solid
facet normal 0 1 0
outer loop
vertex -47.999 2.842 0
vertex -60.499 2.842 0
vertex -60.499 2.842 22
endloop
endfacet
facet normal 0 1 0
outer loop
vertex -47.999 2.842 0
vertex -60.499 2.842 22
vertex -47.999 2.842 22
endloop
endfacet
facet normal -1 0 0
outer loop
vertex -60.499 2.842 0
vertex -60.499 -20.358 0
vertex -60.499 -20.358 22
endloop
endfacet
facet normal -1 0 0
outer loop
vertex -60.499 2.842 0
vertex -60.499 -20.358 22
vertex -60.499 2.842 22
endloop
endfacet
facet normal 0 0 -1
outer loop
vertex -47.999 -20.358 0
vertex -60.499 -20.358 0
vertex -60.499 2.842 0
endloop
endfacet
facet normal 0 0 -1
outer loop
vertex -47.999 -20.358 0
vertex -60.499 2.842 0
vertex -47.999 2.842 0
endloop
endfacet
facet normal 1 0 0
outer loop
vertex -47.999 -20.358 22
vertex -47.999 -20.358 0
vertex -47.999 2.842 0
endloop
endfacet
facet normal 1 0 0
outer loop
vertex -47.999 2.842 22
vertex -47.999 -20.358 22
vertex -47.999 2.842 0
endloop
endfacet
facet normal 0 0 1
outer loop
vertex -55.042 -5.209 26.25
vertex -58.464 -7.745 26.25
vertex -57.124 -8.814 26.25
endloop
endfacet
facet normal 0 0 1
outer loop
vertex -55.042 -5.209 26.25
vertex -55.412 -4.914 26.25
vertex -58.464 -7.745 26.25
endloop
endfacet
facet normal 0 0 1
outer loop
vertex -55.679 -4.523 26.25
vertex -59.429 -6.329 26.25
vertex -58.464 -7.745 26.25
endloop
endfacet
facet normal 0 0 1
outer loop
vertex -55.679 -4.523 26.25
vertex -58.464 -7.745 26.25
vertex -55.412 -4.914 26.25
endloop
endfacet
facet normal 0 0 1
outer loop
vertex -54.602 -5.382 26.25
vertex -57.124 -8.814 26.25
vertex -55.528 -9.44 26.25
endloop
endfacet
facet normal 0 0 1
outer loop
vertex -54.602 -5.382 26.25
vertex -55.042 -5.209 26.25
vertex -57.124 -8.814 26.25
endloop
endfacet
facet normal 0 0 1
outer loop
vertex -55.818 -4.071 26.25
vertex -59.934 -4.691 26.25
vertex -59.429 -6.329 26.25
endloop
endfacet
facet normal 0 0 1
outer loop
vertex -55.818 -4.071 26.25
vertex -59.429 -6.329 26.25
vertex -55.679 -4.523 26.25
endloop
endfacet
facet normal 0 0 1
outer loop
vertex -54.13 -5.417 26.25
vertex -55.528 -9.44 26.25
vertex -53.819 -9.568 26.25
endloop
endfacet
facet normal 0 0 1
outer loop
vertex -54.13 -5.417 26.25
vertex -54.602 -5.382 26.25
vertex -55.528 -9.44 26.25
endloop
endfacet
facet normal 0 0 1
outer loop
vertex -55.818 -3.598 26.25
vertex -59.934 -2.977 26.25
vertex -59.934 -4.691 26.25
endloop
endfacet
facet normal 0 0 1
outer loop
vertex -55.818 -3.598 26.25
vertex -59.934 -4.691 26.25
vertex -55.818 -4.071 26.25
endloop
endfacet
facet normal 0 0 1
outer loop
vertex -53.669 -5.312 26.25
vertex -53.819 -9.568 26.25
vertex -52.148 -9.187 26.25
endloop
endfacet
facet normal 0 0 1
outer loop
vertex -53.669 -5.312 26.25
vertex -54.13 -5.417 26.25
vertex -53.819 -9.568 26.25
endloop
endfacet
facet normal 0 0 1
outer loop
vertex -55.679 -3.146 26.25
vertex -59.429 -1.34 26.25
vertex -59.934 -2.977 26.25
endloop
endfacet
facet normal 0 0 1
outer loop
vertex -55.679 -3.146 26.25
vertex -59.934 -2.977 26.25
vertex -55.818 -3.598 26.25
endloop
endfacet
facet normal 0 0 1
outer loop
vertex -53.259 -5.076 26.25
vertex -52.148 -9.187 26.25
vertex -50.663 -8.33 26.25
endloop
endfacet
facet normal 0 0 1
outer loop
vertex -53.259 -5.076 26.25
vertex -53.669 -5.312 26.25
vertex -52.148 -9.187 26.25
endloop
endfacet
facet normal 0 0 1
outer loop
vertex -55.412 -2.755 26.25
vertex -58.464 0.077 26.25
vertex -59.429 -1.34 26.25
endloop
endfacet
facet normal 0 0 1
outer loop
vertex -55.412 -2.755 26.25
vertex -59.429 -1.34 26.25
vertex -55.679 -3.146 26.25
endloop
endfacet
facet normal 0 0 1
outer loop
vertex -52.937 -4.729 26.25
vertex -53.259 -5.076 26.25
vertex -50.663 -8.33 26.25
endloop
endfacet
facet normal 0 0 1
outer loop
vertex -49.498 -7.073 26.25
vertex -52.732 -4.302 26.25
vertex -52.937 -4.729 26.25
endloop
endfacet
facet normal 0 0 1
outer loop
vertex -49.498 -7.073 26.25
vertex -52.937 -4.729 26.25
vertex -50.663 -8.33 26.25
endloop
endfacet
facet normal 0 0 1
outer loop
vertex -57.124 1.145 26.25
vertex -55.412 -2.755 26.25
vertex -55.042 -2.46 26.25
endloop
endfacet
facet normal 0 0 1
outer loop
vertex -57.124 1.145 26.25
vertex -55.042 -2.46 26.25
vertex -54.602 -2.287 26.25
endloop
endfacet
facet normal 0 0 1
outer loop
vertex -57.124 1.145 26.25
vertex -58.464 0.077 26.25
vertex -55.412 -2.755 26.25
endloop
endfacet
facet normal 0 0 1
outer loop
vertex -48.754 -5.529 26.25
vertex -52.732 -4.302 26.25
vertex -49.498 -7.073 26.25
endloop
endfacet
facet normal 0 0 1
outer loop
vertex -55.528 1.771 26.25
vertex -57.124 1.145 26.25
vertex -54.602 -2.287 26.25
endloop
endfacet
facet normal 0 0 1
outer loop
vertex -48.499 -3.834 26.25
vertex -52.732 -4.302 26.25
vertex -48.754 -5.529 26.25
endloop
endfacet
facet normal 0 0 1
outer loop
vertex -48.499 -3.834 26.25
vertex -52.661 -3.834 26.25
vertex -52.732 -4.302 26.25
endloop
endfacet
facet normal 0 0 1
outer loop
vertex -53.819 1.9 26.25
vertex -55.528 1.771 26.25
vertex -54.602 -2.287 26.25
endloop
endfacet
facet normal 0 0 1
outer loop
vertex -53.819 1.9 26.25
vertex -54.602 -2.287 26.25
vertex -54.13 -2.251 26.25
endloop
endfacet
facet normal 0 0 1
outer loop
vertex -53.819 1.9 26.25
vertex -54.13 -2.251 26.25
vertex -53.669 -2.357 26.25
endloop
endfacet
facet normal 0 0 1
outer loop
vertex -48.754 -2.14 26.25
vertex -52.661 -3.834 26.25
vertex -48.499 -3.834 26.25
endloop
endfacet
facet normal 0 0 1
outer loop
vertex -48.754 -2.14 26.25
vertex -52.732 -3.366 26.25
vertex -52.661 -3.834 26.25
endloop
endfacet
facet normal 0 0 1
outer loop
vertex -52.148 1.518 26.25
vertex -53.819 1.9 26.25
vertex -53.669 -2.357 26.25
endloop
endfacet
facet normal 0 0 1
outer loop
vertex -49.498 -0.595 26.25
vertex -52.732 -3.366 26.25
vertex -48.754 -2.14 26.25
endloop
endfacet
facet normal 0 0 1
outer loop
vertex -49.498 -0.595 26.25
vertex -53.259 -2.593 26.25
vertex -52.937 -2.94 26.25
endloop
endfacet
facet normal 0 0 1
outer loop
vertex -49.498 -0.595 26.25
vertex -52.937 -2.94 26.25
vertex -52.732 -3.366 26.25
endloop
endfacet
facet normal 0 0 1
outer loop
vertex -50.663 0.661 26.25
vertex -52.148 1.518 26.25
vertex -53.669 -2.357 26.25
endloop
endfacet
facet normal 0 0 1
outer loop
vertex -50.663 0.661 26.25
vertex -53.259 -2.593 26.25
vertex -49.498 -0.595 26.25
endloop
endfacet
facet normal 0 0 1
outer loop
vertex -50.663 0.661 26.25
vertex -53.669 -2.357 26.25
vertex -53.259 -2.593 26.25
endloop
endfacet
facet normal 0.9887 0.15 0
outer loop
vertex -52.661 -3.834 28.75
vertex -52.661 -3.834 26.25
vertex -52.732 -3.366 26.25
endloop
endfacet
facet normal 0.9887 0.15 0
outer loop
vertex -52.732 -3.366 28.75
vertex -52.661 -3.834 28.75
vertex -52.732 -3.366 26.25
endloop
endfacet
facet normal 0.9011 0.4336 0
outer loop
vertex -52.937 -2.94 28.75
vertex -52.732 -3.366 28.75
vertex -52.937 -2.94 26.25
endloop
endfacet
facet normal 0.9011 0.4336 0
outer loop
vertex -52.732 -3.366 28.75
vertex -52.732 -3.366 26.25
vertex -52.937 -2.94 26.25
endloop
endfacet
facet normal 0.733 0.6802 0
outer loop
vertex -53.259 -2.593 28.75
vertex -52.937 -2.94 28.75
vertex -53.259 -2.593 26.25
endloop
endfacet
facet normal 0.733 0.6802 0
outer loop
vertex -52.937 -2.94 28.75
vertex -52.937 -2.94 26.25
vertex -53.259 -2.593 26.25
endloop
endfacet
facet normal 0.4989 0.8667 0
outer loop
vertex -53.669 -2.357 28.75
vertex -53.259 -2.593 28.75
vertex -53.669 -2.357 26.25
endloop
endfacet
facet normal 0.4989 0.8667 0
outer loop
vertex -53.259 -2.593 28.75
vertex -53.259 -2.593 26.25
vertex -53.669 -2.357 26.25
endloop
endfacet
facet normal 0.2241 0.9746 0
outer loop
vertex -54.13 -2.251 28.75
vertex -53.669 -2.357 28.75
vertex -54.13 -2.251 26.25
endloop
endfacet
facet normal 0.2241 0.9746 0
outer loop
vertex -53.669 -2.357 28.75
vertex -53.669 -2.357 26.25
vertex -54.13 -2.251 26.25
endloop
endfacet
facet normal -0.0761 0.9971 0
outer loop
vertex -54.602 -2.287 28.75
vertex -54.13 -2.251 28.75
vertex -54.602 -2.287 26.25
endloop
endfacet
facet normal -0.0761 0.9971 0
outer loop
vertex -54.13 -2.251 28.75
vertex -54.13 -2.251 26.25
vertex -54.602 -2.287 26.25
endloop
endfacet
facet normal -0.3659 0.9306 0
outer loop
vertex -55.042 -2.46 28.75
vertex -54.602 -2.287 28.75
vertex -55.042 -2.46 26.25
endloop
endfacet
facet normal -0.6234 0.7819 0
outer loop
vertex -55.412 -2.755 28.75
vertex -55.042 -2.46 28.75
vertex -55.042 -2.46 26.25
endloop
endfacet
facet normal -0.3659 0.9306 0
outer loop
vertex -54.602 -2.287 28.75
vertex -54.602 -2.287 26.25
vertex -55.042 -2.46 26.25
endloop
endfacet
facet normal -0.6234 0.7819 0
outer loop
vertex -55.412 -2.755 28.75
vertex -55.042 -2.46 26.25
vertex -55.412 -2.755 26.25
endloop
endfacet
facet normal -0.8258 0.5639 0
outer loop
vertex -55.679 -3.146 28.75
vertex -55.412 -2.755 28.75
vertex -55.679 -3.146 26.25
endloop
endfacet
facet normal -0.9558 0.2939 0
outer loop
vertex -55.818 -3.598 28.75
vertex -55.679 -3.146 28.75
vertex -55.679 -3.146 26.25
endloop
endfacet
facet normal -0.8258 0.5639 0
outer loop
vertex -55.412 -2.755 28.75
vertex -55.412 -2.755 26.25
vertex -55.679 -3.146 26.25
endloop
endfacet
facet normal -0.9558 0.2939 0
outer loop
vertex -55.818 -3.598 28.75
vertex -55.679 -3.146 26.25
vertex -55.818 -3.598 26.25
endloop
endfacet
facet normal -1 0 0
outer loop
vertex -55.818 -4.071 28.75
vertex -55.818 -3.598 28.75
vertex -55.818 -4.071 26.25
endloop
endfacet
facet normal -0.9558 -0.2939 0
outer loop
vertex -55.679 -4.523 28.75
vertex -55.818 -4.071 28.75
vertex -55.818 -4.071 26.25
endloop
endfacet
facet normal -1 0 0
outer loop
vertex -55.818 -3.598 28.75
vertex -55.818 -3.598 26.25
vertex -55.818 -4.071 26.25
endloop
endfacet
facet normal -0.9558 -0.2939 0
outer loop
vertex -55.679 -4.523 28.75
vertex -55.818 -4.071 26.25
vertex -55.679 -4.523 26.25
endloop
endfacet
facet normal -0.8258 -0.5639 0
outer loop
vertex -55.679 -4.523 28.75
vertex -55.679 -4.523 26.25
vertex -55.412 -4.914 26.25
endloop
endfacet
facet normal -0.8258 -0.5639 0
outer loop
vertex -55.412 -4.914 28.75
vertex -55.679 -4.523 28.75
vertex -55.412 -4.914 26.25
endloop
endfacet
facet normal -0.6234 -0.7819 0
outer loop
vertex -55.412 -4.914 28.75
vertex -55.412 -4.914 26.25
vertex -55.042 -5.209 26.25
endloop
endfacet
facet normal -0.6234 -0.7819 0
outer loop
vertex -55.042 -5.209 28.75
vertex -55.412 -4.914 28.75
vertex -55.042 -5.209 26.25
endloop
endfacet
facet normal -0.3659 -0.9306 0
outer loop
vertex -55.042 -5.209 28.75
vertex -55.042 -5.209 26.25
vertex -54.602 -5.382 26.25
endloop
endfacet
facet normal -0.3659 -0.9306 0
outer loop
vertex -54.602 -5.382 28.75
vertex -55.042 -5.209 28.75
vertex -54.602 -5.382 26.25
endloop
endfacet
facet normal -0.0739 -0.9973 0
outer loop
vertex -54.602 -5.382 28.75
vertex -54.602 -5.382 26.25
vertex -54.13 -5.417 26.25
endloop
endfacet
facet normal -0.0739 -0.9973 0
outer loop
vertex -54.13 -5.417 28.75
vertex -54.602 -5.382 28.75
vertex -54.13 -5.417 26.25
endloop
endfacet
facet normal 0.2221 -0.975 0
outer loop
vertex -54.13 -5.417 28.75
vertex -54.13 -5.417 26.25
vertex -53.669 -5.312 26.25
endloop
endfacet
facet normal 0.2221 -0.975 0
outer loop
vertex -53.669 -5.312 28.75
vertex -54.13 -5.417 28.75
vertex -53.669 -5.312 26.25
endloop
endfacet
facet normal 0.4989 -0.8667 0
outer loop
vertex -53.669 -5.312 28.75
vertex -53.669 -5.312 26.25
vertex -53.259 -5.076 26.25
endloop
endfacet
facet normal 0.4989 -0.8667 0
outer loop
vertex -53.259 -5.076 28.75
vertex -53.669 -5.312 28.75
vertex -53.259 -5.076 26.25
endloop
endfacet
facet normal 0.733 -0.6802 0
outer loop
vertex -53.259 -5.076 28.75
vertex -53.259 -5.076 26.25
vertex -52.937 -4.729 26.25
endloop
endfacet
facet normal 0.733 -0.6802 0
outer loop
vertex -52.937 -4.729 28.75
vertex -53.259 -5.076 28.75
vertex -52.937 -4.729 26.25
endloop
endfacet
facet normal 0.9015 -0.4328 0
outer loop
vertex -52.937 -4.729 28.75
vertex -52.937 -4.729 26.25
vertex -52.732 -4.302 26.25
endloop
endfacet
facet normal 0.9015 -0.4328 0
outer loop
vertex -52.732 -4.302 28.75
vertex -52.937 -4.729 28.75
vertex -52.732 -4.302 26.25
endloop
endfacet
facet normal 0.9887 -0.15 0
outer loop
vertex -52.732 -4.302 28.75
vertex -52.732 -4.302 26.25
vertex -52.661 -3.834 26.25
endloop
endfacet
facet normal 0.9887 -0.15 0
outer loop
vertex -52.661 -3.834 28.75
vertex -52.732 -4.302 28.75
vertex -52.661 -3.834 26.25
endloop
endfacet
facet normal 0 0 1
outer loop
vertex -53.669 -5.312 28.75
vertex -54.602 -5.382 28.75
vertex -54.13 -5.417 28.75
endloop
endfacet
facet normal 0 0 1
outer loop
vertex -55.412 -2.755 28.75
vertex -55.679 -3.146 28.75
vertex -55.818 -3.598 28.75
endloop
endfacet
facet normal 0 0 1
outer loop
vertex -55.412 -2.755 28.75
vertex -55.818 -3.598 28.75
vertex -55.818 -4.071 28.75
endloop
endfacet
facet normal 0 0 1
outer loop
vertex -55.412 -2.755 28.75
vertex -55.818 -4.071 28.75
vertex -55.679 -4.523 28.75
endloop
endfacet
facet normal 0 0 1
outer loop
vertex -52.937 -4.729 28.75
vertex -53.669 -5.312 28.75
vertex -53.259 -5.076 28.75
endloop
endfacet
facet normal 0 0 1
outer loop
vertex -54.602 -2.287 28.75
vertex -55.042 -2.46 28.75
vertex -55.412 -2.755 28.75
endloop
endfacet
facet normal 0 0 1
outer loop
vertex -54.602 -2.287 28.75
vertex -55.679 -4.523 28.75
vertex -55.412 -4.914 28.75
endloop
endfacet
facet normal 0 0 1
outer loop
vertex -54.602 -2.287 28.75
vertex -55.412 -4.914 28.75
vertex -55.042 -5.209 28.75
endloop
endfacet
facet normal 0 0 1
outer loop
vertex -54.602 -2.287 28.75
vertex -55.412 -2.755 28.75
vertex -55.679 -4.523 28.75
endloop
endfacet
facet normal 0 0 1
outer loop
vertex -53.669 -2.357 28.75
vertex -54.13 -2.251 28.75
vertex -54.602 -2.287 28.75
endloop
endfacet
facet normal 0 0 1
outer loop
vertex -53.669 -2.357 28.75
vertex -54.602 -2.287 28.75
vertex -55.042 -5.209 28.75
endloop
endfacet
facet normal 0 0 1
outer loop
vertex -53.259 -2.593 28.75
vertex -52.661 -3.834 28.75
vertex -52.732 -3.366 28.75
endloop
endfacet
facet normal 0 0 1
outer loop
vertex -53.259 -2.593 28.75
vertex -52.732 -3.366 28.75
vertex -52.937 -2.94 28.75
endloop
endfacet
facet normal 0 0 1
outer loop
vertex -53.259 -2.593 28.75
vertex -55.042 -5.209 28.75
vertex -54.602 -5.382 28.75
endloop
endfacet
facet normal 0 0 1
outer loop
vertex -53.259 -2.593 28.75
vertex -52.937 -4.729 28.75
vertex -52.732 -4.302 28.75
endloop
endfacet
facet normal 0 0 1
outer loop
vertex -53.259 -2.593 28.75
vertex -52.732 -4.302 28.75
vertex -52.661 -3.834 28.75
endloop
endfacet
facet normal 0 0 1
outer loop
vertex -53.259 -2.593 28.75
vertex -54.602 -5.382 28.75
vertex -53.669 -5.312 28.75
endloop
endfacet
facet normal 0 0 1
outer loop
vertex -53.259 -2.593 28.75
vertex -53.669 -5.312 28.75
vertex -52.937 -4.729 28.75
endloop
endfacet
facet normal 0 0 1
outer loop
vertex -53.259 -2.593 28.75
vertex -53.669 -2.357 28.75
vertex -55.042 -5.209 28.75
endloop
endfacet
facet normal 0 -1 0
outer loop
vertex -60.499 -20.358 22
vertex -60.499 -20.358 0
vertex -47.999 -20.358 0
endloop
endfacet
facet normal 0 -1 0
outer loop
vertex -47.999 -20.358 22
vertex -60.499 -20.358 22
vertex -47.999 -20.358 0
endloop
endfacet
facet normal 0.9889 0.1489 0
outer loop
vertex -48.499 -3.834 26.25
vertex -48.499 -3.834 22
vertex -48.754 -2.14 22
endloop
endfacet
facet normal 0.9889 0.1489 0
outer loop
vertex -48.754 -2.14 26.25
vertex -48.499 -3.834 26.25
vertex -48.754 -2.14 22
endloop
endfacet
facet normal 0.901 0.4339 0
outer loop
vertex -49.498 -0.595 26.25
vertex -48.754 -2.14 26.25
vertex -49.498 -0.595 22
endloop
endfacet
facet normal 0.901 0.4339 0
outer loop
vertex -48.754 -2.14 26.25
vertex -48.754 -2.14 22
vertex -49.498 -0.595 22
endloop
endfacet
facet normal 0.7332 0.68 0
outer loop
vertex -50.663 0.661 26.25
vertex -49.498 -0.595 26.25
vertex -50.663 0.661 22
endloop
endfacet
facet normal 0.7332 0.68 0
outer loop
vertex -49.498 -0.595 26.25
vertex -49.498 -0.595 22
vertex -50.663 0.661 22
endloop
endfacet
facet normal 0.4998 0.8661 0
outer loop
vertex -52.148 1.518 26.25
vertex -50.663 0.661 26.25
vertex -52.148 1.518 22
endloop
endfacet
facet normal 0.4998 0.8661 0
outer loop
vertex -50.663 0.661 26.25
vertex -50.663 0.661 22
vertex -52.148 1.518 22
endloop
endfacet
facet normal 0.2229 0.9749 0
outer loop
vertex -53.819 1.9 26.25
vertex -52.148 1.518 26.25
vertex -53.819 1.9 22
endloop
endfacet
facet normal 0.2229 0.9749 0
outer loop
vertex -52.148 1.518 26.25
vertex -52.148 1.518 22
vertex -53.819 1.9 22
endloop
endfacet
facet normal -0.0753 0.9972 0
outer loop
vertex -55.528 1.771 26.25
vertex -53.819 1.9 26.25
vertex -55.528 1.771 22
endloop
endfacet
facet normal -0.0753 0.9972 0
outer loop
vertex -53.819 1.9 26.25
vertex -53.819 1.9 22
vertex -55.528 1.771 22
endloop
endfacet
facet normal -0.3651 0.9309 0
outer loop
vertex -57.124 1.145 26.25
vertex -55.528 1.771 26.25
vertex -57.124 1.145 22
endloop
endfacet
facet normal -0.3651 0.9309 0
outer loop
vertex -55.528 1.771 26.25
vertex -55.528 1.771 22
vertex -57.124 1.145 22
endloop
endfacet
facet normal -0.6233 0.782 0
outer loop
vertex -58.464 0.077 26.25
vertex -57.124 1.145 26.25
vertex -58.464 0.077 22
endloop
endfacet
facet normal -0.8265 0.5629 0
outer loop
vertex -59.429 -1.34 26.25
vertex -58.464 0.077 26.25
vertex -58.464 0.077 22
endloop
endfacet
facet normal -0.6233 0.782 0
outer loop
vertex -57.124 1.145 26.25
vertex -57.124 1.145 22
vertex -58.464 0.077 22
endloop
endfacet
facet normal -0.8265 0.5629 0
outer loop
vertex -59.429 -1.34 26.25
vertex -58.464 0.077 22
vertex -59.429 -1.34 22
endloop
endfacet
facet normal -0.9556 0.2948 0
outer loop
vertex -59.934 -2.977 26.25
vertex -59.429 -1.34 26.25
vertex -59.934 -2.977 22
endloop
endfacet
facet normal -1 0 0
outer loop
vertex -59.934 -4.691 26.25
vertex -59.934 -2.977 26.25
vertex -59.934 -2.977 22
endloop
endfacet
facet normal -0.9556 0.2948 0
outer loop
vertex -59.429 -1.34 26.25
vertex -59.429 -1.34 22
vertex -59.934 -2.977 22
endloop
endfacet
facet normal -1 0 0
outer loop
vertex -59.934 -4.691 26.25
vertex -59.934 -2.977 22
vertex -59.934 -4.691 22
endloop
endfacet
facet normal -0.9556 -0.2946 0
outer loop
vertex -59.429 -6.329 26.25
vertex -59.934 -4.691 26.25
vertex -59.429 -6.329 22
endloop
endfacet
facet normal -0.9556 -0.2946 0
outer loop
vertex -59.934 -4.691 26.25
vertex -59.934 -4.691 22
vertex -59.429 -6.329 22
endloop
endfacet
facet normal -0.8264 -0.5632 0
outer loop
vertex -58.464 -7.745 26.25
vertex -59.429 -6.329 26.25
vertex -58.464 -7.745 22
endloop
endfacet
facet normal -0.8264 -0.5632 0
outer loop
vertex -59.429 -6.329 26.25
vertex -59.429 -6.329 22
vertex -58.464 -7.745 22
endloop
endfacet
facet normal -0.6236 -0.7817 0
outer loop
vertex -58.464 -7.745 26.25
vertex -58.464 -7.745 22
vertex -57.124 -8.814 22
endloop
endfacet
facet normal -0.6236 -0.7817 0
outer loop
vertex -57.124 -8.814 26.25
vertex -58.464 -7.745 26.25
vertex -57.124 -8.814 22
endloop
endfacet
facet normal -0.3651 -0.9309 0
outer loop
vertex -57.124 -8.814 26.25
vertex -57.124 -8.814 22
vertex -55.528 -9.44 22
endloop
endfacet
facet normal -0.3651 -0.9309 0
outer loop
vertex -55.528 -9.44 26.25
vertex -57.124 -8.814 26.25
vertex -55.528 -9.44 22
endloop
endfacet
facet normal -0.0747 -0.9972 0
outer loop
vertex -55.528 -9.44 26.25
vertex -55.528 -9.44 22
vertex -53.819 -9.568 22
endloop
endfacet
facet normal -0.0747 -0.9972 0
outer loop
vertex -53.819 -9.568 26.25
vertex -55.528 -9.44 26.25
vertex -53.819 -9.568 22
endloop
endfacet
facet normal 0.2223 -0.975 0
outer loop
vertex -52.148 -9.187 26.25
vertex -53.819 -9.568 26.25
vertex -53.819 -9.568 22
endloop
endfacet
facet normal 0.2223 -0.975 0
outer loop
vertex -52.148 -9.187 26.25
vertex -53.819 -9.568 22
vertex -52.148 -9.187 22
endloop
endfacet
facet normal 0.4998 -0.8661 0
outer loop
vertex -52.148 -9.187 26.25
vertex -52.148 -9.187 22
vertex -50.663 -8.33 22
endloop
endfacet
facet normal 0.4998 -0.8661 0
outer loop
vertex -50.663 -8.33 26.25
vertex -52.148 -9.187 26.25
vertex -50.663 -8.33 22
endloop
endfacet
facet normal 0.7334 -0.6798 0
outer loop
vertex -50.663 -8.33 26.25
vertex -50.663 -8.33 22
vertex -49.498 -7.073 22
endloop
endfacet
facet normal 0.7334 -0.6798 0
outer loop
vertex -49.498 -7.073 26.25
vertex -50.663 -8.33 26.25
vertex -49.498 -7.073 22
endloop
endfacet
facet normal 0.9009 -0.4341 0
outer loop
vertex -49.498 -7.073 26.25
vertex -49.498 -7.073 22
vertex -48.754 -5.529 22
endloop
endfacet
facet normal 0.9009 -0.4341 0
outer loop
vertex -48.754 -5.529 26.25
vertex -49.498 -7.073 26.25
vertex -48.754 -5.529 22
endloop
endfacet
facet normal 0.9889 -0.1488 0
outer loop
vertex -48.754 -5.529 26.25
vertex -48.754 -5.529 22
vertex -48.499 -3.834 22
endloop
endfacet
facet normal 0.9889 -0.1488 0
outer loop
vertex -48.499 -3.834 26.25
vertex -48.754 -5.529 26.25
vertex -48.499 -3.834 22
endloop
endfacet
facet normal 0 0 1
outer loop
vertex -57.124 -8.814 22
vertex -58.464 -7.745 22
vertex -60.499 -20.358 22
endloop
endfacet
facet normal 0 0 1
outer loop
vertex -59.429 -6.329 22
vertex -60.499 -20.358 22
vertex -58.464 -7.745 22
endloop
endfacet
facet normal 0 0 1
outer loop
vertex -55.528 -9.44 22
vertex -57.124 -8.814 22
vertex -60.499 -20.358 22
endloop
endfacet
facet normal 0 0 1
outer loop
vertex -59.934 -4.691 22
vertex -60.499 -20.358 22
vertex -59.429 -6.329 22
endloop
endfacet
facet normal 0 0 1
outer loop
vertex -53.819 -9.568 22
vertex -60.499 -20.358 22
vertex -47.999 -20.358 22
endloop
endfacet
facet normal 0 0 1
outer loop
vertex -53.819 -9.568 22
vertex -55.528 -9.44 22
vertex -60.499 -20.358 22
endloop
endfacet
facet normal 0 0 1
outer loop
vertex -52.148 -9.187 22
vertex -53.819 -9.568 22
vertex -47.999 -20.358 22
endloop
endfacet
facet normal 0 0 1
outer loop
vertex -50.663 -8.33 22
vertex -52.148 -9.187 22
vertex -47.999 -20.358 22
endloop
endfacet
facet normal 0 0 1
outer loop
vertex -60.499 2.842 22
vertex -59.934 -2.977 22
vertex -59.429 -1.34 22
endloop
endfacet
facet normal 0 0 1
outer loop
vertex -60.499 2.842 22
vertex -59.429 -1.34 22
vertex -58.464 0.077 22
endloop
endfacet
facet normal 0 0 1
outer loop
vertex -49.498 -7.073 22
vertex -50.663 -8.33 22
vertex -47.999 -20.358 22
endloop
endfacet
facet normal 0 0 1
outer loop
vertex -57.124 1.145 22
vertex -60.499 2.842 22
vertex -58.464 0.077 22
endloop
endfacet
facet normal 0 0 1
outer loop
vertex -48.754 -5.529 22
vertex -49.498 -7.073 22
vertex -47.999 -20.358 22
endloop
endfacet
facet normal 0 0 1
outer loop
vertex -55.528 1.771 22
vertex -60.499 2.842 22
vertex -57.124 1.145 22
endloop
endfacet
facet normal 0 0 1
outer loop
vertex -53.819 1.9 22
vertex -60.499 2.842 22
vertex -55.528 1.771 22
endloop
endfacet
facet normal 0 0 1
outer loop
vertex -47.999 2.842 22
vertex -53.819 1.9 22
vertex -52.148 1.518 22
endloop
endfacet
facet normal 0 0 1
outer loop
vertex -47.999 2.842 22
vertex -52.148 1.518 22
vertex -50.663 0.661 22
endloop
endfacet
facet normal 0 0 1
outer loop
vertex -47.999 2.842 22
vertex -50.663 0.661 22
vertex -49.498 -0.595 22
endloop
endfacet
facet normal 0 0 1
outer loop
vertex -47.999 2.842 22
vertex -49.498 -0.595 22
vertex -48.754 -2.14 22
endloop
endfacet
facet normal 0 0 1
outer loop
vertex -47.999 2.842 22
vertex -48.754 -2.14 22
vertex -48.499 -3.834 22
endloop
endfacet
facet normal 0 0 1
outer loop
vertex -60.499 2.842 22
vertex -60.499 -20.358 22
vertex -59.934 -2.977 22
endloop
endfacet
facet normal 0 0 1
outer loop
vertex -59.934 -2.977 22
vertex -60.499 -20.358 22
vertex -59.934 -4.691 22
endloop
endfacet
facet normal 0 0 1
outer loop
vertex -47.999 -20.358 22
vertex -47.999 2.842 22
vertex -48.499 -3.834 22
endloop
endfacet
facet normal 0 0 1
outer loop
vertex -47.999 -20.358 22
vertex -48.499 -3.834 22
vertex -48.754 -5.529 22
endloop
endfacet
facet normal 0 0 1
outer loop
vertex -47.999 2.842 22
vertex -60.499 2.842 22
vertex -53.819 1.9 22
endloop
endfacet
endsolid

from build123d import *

# Parameters (mm, degrees)
F0_W     = 12.5
F0_H     = 23.2
F0_R     = 5.75
F0_R_2   = 1.5875
F1_DEPTH = 22
F2_DEPTH = 26.25
F3_DEPTH = 28.75


with BuildPart() as f1:
    # F0 (on Top) → F1 (new body)
    with BuildSketch(Plane.XY):
        with Locations((-54.248546, -8.758007)):
            Rectangle(F0_W, F0_H)
        with Locations((-54.248546, -3.834351)):
            Circle(F0_R, mode=Mode.SUBTRACT)
        with Locations((-54.248546, -3.834351)):
            Circle(F0_R)
        with Locations((-54.248546, -3.834351)):
            Circle(F0_R_2, mode=Mode.SUBTRACT)
        with Locations((-54.248546, -3.834351)):
            Circle(F0_R_2)
    extrude(amount=F1_DEPTH)

    # F0 (on Top) → F2 (join)
    with BuildSketch(Plane.XY):
        with Locations((-54.248546, -3.834351)):
            Circle(F0_R)
        with Locations((-54.248546, -3.834351)):
            Circle(F0_R_2, mode=Mode.SUBTRACT)
        with Locations((-54.248546, -3.834351)):
            Circle(F0_R_2)
    extrude(amount=F2_DEPTH)

    # F0 (on Top) → F3 (join)
    with BuildSketch(Plane.XY):
        with Locations((-54.248546, -3.834351)):
            Circle(F0_R_2)
    extrude(amount=F3_DEPTH)


solid = f1.part
